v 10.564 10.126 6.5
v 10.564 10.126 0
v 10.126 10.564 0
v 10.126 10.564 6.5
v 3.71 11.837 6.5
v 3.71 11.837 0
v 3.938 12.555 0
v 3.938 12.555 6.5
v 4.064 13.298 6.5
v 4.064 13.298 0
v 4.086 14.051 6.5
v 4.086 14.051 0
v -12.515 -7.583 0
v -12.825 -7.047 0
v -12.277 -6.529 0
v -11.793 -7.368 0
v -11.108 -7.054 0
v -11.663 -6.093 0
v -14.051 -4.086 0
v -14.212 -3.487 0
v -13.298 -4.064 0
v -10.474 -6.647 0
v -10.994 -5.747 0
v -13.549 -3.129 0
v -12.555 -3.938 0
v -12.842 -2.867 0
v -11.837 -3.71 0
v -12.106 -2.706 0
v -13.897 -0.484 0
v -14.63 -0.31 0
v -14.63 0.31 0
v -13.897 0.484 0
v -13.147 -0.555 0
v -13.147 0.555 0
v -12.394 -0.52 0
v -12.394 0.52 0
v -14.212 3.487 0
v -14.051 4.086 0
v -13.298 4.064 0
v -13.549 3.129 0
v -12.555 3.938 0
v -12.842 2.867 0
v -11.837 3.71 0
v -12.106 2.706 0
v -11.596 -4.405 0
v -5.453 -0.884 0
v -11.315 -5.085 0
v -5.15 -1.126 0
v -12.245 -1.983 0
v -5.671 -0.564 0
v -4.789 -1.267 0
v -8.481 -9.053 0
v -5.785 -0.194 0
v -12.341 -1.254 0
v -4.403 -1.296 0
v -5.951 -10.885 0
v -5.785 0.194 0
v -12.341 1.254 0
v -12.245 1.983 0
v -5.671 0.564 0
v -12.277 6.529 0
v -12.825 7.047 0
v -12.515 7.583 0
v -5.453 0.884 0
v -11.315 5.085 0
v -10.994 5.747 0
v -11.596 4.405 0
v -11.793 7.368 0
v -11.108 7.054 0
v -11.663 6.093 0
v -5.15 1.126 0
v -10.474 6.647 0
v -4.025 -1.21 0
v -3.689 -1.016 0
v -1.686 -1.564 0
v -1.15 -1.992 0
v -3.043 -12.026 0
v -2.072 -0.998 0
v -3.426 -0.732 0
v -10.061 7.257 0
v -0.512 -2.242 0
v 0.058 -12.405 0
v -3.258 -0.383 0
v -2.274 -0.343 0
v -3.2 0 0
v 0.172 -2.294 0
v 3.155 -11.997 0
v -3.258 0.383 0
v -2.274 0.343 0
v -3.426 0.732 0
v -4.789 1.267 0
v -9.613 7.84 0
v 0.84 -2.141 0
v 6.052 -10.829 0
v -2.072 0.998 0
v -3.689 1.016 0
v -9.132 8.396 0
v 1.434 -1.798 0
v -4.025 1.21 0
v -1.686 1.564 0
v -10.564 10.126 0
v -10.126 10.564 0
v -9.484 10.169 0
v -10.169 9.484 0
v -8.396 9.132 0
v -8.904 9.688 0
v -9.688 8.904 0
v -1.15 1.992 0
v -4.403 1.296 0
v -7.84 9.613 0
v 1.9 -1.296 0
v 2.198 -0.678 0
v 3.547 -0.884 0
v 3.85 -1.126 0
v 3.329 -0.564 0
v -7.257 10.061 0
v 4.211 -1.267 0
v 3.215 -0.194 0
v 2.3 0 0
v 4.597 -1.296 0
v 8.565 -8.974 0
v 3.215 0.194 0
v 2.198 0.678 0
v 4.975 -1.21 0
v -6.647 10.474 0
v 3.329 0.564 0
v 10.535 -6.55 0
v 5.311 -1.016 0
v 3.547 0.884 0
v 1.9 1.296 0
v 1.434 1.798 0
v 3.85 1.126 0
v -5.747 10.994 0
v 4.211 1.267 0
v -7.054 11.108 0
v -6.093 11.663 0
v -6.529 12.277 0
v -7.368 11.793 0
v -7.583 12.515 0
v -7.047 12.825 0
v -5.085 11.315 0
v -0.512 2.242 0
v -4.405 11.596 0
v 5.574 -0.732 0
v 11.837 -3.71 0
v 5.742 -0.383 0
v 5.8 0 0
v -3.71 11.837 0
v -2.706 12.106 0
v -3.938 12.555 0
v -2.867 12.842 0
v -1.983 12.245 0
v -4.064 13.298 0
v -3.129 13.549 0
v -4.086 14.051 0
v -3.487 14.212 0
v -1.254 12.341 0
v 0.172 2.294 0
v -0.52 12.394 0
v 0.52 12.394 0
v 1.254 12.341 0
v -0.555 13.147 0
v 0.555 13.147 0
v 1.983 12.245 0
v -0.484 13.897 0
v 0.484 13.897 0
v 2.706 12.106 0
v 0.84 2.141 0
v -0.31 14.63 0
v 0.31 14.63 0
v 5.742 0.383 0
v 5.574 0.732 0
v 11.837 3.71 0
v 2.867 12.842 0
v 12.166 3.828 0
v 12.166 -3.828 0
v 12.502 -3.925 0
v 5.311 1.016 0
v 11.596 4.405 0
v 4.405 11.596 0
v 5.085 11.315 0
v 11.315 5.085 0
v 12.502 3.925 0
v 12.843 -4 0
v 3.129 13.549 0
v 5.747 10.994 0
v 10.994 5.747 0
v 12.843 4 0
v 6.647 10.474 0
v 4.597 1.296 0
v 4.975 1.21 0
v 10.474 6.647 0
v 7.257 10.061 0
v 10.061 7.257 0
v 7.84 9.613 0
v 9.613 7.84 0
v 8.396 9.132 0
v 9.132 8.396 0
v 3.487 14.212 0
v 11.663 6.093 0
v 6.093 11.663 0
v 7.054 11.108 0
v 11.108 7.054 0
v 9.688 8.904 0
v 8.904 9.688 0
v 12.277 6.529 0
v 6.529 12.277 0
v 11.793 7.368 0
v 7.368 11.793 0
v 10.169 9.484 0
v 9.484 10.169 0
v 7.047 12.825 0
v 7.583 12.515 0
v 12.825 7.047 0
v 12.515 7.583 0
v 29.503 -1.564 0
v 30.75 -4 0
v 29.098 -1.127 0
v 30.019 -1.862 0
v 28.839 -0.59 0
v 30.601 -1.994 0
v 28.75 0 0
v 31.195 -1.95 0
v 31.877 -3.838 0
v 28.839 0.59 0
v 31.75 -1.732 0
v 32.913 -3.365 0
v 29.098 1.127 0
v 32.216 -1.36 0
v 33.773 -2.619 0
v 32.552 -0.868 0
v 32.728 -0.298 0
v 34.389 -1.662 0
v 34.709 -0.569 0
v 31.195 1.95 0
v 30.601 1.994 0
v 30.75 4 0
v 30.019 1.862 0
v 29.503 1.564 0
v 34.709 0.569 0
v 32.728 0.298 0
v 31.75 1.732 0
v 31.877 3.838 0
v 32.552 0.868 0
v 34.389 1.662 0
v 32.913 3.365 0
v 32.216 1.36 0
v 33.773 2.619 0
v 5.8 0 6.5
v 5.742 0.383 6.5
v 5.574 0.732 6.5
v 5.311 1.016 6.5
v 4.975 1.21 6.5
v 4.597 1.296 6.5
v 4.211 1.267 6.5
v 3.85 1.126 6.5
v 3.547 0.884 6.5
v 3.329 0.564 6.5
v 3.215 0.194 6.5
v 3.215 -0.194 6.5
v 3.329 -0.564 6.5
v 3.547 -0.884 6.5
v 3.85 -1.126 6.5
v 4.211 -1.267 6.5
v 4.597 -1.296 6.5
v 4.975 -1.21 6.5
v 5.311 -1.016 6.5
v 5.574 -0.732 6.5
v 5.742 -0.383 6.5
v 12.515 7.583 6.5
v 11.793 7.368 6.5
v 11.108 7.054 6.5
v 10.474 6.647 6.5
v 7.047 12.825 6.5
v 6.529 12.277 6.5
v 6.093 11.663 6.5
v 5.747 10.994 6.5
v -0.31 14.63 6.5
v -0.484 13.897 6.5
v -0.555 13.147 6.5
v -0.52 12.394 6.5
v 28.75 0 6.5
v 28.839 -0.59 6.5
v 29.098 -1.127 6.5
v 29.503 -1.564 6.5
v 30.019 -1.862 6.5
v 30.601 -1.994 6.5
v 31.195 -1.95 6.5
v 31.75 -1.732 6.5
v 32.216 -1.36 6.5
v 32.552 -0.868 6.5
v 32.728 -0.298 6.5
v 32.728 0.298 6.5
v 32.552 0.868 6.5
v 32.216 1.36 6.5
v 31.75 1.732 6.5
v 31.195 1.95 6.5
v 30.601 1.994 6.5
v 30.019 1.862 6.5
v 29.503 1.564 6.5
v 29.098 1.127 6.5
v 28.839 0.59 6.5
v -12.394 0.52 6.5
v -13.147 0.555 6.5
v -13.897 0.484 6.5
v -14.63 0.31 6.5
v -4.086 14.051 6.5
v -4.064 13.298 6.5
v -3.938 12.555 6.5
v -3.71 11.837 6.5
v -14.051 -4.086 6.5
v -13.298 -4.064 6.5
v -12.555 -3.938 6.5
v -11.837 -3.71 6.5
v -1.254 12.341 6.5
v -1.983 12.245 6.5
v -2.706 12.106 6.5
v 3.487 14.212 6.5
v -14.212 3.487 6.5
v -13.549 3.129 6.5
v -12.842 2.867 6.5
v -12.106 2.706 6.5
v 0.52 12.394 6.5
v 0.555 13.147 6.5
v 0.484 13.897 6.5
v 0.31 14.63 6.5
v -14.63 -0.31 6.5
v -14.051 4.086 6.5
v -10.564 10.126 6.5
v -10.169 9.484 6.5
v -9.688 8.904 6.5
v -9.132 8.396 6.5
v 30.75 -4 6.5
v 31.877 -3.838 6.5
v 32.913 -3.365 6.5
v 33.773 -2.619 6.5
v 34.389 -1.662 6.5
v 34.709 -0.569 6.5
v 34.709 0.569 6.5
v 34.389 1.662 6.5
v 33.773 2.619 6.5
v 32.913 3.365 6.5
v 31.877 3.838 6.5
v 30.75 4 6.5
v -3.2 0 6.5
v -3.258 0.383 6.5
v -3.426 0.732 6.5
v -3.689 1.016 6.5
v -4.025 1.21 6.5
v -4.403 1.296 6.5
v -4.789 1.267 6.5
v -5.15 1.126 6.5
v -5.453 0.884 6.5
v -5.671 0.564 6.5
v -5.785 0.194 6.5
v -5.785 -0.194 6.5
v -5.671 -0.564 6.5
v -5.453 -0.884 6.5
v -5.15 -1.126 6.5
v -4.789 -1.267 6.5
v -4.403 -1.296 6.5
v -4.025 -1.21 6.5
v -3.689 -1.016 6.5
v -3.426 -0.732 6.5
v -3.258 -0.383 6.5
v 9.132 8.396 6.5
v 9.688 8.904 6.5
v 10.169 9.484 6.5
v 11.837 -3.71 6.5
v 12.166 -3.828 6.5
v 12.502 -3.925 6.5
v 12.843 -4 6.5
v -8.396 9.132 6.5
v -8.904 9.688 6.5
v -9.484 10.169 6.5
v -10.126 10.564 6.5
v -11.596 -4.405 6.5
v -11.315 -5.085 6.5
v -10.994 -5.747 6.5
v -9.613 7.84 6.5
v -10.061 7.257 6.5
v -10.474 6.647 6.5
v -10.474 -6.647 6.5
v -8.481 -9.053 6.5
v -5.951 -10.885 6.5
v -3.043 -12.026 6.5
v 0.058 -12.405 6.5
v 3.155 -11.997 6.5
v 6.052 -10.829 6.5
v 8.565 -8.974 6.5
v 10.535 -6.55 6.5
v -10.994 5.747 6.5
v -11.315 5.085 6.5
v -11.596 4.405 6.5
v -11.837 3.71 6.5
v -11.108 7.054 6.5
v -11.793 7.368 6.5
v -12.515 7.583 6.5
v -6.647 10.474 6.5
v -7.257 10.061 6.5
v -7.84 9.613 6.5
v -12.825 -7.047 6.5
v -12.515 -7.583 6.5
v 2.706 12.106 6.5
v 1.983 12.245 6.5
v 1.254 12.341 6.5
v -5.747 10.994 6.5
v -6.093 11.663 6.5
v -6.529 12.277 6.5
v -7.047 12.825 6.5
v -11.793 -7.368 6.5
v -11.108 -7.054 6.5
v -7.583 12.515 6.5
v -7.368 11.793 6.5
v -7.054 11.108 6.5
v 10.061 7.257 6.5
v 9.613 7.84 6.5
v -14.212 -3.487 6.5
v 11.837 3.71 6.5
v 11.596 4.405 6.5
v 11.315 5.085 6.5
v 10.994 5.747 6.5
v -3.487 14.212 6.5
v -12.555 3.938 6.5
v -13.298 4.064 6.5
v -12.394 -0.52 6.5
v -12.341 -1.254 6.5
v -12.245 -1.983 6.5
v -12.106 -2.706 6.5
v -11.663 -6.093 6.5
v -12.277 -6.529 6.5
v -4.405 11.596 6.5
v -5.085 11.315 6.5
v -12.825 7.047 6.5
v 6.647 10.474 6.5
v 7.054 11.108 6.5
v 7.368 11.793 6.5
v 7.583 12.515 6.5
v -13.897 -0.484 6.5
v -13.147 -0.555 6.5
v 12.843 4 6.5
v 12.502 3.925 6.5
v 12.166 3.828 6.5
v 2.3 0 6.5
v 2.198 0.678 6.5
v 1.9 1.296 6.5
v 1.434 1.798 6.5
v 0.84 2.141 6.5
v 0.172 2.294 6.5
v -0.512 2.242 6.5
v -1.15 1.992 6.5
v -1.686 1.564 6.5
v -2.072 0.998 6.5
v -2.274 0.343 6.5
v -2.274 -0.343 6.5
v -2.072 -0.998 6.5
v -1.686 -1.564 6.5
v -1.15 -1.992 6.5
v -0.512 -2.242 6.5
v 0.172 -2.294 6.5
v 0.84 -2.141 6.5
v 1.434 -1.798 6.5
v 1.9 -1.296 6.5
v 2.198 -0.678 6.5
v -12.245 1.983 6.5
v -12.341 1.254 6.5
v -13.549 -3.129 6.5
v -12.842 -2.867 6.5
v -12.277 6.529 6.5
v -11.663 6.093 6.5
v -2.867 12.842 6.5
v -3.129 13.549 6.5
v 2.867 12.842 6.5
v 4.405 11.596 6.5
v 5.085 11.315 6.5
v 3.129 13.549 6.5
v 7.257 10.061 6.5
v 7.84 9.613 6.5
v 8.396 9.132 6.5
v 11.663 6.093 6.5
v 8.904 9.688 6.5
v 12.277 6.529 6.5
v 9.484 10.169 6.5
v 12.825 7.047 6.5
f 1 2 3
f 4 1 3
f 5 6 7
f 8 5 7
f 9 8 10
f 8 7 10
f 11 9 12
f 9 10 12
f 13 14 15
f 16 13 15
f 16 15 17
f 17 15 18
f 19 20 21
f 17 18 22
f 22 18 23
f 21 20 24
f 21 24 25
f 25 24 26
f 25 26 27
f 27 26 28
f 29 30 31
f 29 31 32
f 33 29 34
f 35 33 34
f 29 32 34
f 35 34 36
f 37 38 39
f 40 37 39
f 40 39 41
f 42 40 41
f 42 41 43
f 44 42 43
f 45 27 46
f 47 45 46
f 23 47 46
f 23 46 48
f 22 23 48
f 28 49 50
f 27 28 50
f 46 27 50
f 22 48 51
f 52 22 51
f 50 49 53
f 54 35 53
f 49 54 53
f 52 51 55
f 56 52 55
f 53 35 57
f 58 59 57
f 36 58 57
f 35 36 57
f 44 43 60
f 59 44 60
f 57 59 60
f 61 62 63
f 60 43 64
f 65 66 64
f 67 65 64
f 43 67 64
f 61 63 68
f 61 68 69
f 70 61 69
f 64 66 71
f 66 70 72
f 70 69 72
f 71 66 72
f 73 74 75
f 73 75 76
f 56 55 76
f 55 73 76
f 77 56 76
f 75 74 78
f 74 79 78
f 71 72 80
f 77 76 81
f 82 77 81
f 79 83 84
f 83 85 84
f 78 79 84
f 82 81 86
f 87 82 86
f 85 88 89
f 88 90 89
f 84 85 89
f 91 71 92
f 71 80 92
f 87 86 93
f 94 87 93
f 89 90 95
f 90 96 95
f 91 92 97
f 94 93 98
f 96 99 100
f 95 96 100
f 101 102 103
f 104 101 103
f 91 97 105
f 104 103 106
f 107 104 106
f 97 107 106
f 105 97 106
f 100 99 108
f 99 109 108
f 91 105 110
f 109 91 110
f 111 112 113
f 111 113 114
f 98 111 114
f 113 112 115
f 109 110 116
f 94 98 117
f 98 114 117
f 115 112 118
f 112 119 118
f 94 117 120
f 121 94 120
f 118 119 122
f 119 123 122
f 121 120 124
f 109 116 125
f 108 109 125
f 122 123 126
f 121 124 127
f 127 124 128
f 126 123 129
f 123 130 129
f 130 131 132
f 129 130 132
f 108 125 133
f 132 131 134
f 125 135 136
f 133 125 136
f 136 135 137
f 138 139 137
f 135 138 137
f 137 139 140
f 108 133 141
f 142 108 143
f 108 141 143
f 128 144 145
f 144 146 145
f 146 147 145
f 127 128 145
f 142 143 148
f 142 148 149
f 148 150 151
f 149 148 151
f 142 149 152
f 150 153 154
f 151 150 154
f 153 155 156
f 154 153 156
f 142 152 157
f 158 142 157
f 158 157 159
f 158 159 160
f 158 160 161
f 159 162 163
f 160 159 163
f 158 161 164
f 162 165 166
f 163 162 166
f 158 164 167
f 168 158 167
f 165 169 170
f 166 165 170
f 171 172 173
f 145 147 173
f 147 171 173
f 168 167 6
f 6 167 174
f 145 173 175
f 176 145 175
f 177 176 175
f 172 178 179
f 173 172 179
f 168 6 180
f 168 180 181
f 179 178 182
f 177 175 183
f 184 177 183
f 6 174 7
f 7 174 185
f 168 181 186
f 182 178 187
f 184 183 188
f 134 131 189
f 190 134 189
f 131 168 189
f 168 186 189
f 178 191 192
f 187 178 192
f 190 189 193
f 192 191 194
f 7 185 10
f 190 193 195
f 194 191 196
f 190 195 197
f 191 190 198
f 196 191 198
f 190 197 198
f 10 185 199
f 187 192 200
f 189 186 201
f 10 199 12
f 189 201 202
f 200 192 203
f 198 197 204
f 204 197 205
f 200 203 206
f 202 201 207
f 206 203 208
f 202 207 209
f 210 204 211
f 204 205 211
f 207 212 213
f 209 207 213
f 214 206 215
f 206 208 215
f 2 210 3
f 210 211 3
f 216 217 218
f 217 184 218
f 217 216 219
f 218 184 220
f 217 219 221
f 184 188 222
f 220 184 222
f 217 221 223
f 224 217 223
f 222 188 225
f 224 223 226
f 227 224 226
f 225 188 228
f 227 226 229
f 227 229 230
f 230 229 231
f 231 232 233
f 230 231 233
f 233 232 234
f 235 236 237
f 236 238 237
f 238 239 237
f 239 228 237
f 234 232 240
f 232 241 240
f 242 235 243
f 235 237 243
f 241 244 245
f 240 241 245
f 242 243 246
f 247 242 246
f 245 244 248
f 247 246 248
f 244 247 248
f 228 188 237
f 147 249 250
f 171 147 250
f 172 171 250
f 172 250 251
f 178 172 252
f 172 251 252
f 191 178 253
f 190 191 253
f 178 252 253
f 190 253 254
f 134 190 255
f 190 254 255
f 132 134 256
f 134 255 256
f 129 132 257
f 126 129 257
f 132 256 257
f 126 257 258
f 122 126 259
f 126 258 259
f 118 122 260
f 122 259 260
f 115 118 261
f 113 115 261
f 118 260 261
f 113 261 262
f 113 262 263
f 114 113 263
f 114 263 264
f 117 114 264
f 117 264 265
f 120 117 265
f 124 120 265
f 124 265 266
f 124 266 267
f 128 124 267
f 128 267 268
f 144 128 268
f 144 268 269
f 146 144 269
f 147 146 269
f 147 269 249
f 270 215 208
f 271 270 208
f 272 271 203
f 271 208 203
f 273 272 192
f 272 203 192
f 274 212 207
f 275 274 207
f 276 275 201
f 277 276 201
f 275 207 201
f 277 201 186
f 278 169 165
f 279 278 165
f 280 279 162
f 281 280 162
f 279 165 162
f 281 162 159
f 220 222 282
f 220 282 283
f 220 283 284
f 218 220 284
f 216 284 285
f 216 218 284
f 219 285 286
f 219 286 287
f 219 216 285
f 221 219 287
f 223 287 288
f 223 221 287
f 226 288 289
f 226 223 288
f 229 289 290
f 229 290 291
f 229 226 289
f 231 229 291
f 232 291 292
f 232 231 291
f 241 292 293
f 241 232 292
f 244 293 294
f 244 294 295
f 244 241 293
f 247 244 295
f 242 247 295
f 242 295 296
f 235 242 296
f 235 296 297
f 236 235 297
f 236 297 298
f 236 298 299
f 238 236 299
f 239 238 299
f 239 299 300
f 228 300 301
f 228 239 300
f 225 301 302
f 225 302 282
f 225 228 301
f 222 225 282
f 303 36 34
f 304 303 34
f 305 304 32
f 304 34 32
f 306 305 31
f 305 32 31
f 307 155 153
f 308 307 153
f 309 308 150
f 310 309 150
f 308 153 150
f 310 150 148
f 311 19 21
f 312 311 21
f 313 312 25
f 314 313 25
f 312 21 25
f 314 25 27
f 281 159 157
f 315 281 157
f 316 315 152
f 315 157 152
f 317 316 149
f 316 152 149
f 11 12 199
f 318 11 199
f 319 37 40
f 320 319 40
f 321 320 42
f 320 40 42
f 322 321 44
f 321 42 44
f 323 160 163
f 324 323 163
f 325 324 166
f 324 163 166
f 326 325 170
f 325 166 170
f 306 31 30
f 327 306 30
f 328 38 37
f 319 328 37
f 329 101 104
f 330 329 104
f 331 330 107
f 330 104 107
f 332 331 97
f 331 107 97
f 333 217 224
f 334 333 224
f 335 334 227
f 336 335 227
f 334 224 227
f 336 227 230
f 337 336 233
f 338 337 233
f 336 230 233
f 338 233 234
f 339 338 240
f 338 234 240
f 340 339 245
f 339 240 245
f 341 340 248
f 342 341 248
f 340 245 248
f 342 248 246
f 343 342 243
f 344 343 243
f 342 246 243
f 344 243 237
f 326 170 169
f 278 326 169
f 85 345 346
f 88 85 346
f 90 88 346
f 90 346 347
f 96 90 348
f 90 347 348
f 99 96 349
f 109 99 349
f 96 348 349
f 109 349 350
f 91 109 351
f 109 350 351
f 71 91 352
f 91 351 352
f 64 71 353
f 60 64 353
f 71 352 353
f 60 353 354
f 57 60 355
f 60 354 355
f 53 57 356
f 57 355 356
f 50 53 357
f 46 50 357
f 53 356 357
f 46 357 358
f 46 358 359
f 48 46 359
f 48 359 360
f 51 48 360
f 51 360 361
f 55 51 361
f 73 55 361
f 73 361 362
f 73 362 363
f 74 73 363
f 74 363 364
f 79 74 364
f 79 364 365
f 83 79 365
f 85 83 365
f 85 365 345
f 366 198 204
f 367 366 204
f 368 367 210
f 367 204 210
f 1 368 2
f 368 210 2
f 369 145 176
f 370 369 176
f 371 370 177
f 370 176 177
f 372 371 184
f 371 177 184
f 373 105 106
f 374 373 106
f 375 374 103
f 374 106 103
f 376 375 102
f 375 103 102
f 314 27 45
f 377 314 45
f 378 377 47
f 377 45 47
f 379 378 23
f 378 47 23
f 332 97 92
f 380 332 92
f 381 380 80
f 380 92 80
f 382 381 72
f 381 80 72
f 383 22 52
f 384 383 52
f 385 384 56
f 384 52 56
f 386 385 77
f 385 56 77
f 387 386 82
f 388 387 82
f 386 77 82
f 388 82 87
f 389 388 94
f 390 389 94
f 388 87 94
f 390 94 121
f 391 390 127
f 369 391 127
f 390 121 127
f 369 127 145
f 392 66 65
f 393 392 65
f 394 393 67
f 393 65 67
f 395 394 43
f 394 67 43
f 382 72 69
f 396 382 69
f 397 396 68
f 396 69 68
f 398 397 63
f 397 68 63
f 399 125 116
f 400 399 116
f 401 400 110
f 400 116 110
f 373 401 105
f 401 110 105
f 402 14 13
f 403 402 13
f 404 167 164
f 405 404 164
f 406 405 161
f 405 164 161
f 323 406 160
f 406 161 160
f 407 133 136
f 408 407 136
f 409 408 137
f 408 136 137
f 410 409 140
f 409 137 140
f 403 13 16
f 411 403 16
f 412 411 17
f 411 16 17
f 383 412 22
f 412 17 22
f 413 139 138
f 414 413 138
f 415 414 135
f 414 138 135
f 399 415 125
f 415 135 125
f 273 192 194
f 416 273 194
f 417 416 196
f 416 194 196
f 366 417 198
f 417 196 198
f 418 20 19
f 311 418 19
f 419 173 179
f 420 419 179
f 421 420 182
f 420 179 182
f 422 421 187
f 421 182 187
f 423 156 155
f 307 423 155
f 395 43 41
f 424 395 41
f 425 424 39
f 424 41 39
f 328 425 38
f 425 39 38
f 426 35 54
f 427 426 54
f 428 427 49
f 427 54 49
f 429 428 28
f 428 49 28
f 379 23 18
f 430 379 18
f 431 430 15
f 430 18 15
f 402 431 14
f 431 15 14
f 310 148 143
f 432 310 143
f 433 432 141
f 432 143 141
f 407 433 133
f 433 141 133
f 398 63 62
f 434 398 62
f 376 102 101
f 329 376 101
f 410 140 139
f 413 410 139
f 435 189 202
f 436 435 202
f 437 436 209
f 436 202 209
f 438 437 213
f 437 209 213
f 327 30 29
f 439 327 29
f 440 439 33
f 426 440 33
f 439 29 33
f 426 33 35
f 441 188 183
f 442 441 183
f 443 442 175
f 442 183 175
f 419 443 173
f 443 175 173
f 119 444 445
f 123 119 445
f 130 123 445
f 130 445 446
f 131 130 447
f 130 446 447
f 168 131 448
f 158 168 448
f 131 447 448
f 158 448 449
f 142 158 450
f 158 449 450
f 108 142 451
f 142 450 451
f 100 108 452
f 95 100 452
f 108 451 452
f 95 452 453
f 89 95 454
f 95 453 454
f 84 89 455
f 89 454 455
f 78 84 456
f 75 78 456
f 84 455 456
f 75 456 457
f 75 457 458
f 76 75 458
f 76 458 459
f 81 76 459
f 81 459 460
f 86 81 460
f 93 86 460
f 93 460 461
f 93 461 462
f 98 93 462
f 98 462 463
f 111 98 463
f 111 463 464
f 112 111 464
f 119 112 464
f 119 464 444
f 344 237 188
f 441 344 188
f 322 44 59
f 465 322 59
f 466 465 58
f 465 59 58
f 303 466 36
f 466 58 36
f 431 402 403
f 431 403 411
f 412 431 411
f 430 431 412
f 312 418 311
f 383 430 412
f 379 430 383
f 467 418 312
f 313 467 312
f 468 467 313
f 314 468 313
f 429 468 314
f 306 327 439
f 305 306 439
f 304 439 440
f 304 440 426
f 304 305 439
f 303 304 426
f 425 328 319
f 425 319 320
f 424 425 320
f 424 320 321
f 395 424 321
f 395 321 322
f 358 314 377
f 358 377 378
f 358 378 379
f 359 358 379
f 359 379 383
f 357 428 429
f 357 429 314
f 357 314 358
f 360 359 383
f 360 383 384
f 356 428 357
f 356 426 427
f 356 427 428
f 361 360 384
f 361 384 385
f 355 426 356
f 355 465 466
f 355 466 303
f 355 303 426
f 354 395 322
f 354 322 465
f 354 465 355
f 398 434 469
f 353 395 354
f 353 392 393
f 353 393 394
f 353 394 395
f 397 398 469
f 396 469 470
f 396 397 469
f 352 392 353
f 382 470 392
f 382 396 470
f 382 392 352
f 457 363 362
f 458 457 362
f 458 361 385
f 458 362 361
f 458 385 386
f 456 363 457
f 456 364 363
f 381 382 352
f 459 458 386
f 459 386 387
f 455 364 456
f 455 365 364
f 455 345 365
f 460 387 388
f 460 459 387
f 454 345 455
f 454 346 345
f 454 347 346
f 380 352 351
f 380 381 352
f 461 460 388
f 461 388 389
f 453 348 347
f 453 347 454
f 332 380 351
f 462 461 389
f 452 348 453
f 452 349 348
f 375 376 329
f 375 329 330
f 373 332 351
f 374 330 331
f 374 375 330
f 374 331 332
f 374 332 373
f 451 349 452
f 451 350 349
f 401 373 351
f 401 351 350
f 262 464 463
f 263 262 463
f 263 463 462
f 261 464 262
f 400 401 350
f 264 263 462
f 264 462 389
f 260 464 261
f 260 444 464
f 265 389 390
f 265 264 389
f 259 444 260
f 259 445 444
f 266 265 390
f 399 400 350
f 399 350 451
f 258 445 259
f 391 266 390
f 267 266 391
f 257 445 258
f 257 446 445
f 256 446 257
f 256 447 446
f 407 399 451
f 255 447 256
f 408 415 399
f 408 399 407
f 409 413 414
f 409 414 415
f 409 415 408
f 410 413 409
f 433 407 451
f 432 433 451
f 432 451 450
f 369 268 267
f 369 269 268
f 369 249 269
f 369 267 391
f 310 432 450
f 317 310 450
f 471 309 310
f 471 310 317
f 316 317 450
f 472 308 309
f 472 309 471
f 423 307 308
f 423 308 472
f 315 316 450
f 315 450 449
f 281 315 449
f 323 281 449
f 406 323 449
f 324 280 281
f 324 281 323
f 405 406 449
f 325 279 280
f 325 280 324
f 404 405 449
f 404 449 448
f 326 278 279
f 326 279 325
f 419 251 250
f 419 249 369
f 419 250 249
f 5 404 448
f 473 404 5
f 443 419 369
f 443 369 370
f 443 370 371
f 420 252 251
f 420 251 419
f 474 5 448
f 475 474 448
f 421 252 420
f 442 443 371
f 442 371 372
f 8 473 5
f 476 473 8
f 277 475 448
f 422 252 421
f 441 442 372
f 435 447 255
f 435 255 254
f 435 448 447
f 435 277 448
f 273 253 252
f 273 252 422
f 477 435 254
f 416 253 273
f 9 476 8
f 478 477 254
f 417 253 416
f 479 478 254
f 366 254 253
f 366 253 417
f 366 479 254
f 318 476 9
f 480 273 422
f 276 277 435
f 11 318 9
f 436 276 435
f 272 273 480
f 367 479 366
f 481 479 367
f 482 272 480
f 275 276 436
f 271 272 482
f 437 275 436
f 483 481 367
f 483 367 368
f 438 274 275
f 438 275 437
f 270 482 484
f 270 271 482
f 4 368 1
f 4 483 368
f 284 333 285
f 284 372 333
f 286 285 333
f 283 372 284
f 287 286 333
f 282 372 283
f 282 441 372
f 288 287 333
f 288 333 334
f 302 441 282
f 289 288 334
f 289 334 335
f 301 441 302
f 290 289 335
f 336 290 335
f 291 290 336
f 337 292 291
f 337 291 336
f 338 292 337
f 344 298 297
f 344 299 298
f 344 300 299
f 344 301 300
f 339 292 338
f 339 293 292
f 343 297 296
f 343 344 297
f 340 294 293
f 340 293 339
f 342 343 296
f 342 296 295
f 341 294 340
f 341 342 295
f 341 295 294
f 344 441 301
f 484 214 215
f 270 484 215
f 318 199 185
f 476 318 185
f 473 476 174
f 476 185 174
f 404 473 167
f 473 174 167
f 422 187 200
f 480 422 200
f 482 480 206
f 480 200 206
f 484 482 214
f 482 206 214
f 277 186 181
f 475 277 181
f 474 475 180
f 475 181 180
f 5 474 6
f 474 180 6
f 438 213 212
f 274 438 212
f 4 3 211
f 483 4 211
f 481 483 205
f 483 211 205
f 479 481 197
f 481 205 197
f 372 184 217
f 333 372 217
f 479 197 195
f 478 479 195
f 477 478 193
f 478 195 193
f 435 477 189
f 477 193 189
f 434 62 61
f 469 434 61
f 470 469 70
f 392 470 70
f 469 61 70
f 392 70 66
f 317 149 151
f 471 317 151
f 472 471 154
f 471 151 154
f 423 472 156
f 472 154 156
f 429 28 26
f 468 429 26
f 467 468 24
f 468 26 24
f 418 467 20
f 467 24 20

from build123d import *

# Parameters (mm, degrees)
SKETCH1_R           = 1.75
SKETCH1_R_2         = 2
BOSS_EXTRUDE1_DEPTH = 6.5
SKETCH2_R           = 2.3
SKETCH2_R_2         = 1.3
CUT_EXTRUDE1_DEPTH  = 39.260284892


with BuildPart() as part:
    # Sketch1 → Boss-Extrude1 (new body)
    with BuildSketch(Plane.XY):
        with BuildLine():
            Line((0.31, 14.63), (-0.31, 14.63))
            ThreePointArc((-0.31, 14.63), (-0.532517386, 13.523085628), (-0.52, 12.394096377))
            ThreePointArc((-0.52, 12.394096377), (-1.619177414, 12.298873505), (-2.70554676, 12.106363687))
            ThreePointArc((-2.70554676, 12.106363687), (-2.985659813, 13.2001233), (-3.487085624, 14.211728743))
            Line((-3.487085624, 14.211728743), (-4.085959636, 14.051260935))
            ThreePointArc((-4.085959636, 14.051260935), (-4.014404405, 12.924472018), (-3.710109619, 11.837191881))
            ThreePointArc((-3.710109619, 11.837191881), (-4.747187978, 11.460725601), (-5.746714978, 10.993602319))
            ThreePointArc((-5.746714978, 10.993602319), (-6.30036923, 11.977594384), (-7.046532125, 12.824951657))
            Line((-7.046532125, 12.824951657), (-7.583467875, 12.514951657))
            ThreePointArc((-7.583467875, 12.514951657), (-7.222716398, 11.445076999), (-6.647381398, 10.473602319))
            ThreePointArc((-6.647381398, 10.473602319), (-7.551685527, 9.841548186), (-8.396254069, 9.131645121))
            ThreePointArc((-8.396254069, 9.131645121), (-9.185718896, 9.938812205), (-10.125769107, 10.564175311))
            Line((-10.125769107, 10.564175311), (-10.564175311, 10.125769107))
            ThreePointArc((-10.564175311, 10.125769107), (-9.938812205, 9.185718896), (-9.131645121, 8.396254069))
            ThreePointArc((-9.131645121, 8.396254069), (-9.841548186, 7.551685527), (-10.473602319, 6.647381398))
            ThreePointArc((-10.473602319, 6.647381398), (-11.445076999, 7.222716398), (-12.514951657, 7.583467875))
            Line((-12.514951657, 7.583467875), (-12.824951657, 7.046532125))
            ThreePointArc((-12.824951657, 7.046532125), (-11.977594384, 6.30036923), (-10.993602319, 5.746714978))
            ThreePointArc((-10.993602319, 5.746714978), (-11.460725601, 4.747187978), (-11.837191881, 3.710109619))
            ThreePointArc((-11.837191881, 3.710109619), (-12.924472018, 4.014404405), (-14.051260935, 4.085959636))
            Line((-14.051260935, 4.085959636), (-14.211728743, 3.487085624))
            ThreePointArc((-14.211728743, 3.487085624), (-13.2001233, 2.985659813), (-12.106363687, 2.70554676))
            ThreePointArc((-12.106363687, 2.70554676), (-12.298873505, 1.619177414), (-12.394096377, 0.52))
            ThreePointArc((-12.394096377, 0.52), (-13.523085628, 0.532517386), (-14.63, 0.31))
            Line((-14.63, 0.31), (-14.63, -0.31))
            ThreePointArc((-14.63, -0.31), (-13.523085628, -0.532517386), (-12.394096377, -0.52))
            ThreePointArc((-12.394096377, -0.52), (-12.298873505, -1.619177414), (-12.106363687, -2.70554676))
            ThreePointArc((-12.106363687, -2.70554676), (-13.2001233, -2.985659813), (-14.211728743, -3.487085624))
            Line((-14.211728743, -3.487085624), (-14.051260935, -4.085959636))
            ThreePointArc((-14.051260935, -4.085959636), (-12.924472018, -4.014404405), (-11.837191881, -3.710109619))
            ThreePointArc((-11.837191881, -3.710109619), (-11.460725601, -4.747187978), (-10.993602319, -5.746714978))
            ThreePointArc((-10.993602319, -5.746714978), (-11.977594384, -6.30036923), (-12.824951657, -7.046532125))
            Line((-12.824951657, -7.046532125), (-12.514951657, -7.583467875))
            ThreePointArc((-12.514951657, -7.583467875), (-11.445076999, -7.222716398), (-10.473602319, -6.647381398))
            ThreePointArc((-10.473602319, -6.647381398), (1.619177414, -12.298873505), (11.837191881, -3.710109619))
            ThreePointArc((11.837191881, -3.710109619), (12.333238692, -3.879500788), (12.84337176, -4))
            Line((12.84337176, -4), (30.75, -4))
            ThreePointArc((30.75, -4), (34.75, 0), (30.75, 4))
            Line((30.75, 4), (12.84337176, 4))
            ThreePointArc((12.84337176, 4), (12.333238692, 3.879500788), (11.837191881, 3.710109619))
            ThreePointArc((11.837191881, 3.710109619), (11.460725601, 4.747187978), (10.993602319, 5.746714978))
            ThreePointArc((10.993602319, 5.746714978), (11.977594384, 6.30036923), (12.824951657, 7.046532125))
            Line((12.824951657, 7.046532125), (12.514951657, 7.583467875))
            ThreePointArc((12.514951657, 7.583467875), (11.445076999, 7.222716398), (10.473602319, 6.647381398))
            ThreePointArc((10.473602319, 6.647381398), (9.841548186, 7.551685527), (9.131645121, 8.396254069))
            ThreePointArc((9.131645121, 8.396254069), (9.938812205, 9.185718896), (10.564175311, 10.125769107))
            Line((10.564175311, 10.125769107), (10.125769107, 10.564175311))
            ThreePointArc((10.125769107, 10.564175311), (9.185718896, 9.938812205), (8.396254069, 9.131645121))
            ThreePointArc((8.396254069, 9.131645121), (7.551685527, 9.841548186), (6.647381398, 10.473602319))
            ThreePointArc((6.647381398, 10.473602319), (7.222716398, 11.445076999), (7.583467875, 12.514951657))
            Line((7.583467875, 12.514951657), (7.046532125, 12.824951657))
            ThreePointArc((7.046532125, 12.824951657), (6.30036923, 11.977594384), (5.746714978, 10.993602319))
            ThreePointArc((5.746714978, 10.993602319), (4.747187978, 11.460725601), (3.710109619, 11.837191881))
            ThreePointArc((3.710109619, 11.837191881), (4.014404405, 12.924472018), (4.085959636, 14.051260935))
            Line((4.085959636, 14.051260935), (3.487085624, 14.211728743))
            ThreePointArc((3.487085624, 14.211728743), (2.985659813, 13.2001233), (2.70554676, 12.106363687))
            ThreePointArc((2.70554676, 12.106363687), (1.619177414, 12.298873505), (0.52, 12.394096377))
            ThreePointArc((0.52, 12.394096377), (0.532517386, 13.523085628), (0.31, 14.63))
        make_face()
        with Locations(Location((0, 0, 0), (0, 0, 180))):
            Circle(SKETCH1_R, mode=Mode.SUBTRACT)
        with Locations(Location((30.75, 0, 0), (0, 0, 180))):
            Circle(SKETCH1_R_2, mode=Mode.SUBTRACT)
    extrude(amount=BOSS_EXTRUDE1_DEPTH)

    # Sketch2 → Cut-Extrude1 (cut, through all)
    with BuildSketch(Plane.XY.offset(6.5)):
        Circle(SKETCH2_R)
        with Locations((4.5, 0)):
            Circle(SKETCH2_R_2)
        with Locations((-4.5, 0)):
            Circle(SKETCH2_R_2)
    extrude(amount=-CUT_EXTRUDE1_DEPTH, mode=Mode.SUBTRACT)


solid = part.part
